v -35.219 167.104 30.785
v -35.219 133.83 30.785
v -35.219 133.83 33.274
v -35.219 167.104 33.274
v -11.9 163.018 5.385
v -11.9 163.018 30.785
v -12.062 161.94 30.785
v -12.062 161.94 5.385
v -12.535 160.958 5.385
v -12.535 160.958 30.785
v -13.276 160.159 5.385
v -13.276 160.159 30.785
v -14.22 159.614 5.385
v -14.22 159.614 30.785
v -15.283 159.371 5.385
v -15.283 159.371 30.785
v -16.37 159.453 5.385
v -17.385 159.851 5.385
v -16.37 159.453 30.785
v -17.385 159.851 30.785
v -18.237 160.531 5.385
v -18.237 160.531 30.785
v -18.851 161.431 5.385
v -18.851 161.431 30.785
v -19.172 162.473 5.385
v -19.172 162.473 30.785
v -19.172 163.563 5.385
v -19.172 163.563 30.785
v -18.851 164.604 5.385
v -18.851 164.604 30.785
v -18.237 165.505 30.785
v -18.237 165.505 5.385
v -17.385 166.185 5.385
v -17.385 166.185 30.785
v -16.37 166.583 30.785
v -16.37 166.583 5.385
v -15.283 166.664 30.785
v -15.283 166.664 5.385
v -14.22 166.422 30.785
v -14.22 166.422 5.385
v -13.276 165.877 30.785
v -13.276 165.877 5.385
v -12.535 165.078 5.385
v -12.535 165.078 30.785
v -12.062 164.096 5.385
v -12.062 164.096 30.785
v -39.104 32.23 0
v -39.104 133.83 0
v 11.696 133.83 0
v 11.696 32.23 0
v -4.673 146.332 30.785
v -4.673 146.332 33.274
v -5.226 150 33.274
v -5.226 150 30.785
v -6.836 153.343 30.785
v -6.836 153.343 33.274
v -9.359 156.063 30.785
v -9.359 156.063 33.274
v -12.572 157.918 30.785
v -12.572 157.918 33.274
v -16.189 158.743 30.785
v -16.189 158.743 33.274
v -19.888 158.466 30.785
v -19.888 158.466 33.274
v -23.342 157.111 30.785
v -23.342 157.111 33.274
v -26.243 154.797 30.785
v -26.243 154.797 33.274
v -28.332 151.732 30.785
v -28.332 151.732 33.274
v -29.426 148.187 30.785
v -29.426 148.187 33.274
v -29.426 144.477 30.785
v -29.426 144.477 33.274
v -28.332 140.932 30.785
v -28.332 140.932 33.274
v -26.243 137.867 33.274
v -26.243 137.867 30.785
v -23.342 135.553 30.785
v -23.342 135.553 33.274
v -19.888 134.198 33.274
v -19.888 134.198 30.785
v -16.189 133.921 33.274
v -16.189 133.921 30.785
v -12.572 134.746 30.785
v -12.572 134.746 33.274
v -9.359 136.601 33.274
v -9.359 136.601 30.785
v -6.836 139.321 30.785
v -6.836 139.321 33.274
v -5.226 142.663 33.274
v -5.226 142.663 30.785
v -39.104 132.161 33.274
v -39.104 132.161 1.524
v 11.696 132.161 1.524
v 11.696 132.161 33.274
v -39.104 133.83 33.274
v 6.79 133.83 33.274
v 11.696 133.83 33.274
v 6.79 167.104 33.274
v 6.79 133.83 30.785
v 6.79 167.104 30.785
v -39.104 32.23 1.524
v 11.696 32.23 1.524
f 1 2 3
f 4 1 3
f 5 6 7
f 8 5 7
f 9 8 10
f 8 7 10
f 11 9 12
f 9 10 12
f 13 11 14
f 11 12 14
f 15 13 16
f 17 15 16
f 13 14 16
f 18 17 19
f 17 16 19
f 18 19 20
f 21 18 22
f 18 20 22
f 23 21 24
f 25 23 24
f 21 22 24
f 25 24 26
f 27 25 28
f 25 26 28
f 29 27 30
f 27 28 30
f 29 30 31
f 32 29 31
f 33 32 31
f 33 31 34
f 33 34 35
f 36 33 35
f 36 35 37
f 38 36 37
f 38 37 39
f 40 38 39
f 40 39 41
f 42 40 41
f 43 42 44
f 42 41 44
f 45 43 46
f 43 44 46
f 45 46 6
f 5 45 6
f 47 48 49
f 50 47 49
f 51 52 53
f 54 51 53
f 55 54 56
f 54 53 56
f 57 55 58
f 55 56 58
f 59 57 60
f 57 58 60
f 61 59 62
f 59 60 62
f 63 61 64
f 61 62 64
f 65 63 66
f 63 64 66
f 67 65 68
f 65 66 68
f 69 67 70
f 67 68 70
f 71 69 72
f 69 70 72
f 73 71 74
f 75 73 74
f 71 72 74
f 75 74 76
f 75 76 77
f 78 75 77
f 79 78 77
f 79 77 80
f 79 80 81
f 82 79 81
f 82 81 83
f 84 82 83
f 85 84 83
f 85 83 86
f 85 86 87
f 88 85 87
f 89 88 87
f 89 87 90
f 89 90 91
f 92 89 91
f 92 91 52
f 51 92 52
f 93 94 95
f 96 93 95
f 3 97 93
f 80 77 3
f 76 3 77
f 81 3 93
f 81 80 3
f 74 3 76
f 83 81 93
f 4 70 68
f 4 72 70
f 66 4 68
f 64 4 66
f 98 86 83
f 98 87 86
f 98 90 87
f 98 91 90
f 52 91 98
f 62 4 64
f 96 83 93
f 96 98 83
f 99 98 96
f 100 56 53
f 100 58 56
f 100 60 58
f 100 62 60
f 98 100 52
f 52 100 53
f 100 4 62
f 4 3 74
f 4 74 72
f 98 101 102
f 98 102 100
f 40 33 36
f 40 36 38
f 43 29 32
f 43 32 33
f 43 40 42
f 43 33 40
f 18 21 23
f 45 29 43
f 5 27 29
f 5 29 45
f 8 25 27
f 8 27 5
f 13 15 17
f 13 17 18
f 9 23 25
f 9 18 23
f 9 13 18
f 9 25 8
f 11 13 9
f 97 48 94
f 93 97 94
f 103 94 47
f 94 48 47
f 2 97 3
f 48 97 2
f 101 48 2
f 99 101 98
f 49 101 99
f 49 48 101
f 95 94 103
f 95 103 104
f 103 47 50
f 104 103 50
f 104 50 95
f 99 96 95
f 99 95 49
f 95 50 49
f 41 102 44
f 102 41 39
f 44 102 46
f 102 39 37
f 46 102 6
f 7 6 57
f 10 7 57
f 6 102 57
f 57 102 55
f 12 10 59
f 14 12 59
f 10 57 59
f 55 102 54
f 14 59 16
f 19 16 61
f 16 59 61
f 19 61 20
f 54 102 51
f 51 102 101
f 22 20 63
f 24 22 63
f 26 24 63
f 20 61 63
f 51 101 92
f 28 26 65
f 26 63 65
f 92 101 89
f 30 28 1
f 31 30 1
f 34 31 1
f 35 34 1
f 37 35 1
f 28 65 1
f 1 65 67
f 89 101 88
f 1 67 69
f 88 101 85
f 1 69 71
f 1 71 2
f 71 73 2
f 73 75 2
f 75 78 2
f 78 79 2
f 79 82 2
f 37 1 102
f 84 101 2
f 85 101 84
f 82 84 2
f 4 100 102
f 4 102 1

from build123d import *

# Parameters (mm, degrees)
F0_W     = 50.8
F0_H     = 1.668666
F0_H_2   = 99.931334
F1_DEPTH = 1.524
F2_DEPTH = 33.274
F3_W     = 42.008801
F3_H     = 2.4892
F4_DEPTH = 33.274
F5_R     = 12.446
F6_DEPTH = 25.4
F7_R     = 3.656717
F8_DEPTH = 25.4


with BuildPart() as f1:
    # F0 (on Top) → F1 (new body)
    with BuildSketch(Plane.XY):
        with Locations((-13.704186, 132.995608)):
            Rectangle(F0_W, F0_H)
        with Locations((-13.704186, 82.195608)):
            Rectangle(F0_W, F0_H_2)
    extrude(amount=F1_DEPTH)

    # F0 (on Top) → F2 (join)
    with BuildSketch(Plane.XY):
        with Locations((-13.704186, 132.995608)):
            Rectangle(F0_W, F0_H)
    extrude(amount=F2_DEPTH)

    # F3 (on face) → F4 (join)
    with BuildSketch(Plane(origin=(0, 133.829941, 0), x_dir=(-1, 0, 0), z_dir=(0, 1, 0))):
        with Locations((14.214616, 32.0294)):
            Rectangle(F3_W, F3_H)
    extrude(amount=F4_DEPTH)

    # F5 (on face) → F6 (cut)
    with BuildSketch(Plane.XY.offset(33.274)):
        with Locations((-17.118977, 146.331966)):
            Circle(F5_R)
    extrude(amount=-F6_DEPTH, mode=Mode.SUBTRACT)

    # F7 (on face) → F8 (join)
    with BuildSketch(Plane(origin=(0, 0, 30.7848), x_dir=(1, 0, 0), z_dir=(0, 0, -1))):
        with Locations((-15.556242, -163.017869)):
            Circle(F7_R)
    extrude(amount=F8_DEPTH)


solid = f1.part
